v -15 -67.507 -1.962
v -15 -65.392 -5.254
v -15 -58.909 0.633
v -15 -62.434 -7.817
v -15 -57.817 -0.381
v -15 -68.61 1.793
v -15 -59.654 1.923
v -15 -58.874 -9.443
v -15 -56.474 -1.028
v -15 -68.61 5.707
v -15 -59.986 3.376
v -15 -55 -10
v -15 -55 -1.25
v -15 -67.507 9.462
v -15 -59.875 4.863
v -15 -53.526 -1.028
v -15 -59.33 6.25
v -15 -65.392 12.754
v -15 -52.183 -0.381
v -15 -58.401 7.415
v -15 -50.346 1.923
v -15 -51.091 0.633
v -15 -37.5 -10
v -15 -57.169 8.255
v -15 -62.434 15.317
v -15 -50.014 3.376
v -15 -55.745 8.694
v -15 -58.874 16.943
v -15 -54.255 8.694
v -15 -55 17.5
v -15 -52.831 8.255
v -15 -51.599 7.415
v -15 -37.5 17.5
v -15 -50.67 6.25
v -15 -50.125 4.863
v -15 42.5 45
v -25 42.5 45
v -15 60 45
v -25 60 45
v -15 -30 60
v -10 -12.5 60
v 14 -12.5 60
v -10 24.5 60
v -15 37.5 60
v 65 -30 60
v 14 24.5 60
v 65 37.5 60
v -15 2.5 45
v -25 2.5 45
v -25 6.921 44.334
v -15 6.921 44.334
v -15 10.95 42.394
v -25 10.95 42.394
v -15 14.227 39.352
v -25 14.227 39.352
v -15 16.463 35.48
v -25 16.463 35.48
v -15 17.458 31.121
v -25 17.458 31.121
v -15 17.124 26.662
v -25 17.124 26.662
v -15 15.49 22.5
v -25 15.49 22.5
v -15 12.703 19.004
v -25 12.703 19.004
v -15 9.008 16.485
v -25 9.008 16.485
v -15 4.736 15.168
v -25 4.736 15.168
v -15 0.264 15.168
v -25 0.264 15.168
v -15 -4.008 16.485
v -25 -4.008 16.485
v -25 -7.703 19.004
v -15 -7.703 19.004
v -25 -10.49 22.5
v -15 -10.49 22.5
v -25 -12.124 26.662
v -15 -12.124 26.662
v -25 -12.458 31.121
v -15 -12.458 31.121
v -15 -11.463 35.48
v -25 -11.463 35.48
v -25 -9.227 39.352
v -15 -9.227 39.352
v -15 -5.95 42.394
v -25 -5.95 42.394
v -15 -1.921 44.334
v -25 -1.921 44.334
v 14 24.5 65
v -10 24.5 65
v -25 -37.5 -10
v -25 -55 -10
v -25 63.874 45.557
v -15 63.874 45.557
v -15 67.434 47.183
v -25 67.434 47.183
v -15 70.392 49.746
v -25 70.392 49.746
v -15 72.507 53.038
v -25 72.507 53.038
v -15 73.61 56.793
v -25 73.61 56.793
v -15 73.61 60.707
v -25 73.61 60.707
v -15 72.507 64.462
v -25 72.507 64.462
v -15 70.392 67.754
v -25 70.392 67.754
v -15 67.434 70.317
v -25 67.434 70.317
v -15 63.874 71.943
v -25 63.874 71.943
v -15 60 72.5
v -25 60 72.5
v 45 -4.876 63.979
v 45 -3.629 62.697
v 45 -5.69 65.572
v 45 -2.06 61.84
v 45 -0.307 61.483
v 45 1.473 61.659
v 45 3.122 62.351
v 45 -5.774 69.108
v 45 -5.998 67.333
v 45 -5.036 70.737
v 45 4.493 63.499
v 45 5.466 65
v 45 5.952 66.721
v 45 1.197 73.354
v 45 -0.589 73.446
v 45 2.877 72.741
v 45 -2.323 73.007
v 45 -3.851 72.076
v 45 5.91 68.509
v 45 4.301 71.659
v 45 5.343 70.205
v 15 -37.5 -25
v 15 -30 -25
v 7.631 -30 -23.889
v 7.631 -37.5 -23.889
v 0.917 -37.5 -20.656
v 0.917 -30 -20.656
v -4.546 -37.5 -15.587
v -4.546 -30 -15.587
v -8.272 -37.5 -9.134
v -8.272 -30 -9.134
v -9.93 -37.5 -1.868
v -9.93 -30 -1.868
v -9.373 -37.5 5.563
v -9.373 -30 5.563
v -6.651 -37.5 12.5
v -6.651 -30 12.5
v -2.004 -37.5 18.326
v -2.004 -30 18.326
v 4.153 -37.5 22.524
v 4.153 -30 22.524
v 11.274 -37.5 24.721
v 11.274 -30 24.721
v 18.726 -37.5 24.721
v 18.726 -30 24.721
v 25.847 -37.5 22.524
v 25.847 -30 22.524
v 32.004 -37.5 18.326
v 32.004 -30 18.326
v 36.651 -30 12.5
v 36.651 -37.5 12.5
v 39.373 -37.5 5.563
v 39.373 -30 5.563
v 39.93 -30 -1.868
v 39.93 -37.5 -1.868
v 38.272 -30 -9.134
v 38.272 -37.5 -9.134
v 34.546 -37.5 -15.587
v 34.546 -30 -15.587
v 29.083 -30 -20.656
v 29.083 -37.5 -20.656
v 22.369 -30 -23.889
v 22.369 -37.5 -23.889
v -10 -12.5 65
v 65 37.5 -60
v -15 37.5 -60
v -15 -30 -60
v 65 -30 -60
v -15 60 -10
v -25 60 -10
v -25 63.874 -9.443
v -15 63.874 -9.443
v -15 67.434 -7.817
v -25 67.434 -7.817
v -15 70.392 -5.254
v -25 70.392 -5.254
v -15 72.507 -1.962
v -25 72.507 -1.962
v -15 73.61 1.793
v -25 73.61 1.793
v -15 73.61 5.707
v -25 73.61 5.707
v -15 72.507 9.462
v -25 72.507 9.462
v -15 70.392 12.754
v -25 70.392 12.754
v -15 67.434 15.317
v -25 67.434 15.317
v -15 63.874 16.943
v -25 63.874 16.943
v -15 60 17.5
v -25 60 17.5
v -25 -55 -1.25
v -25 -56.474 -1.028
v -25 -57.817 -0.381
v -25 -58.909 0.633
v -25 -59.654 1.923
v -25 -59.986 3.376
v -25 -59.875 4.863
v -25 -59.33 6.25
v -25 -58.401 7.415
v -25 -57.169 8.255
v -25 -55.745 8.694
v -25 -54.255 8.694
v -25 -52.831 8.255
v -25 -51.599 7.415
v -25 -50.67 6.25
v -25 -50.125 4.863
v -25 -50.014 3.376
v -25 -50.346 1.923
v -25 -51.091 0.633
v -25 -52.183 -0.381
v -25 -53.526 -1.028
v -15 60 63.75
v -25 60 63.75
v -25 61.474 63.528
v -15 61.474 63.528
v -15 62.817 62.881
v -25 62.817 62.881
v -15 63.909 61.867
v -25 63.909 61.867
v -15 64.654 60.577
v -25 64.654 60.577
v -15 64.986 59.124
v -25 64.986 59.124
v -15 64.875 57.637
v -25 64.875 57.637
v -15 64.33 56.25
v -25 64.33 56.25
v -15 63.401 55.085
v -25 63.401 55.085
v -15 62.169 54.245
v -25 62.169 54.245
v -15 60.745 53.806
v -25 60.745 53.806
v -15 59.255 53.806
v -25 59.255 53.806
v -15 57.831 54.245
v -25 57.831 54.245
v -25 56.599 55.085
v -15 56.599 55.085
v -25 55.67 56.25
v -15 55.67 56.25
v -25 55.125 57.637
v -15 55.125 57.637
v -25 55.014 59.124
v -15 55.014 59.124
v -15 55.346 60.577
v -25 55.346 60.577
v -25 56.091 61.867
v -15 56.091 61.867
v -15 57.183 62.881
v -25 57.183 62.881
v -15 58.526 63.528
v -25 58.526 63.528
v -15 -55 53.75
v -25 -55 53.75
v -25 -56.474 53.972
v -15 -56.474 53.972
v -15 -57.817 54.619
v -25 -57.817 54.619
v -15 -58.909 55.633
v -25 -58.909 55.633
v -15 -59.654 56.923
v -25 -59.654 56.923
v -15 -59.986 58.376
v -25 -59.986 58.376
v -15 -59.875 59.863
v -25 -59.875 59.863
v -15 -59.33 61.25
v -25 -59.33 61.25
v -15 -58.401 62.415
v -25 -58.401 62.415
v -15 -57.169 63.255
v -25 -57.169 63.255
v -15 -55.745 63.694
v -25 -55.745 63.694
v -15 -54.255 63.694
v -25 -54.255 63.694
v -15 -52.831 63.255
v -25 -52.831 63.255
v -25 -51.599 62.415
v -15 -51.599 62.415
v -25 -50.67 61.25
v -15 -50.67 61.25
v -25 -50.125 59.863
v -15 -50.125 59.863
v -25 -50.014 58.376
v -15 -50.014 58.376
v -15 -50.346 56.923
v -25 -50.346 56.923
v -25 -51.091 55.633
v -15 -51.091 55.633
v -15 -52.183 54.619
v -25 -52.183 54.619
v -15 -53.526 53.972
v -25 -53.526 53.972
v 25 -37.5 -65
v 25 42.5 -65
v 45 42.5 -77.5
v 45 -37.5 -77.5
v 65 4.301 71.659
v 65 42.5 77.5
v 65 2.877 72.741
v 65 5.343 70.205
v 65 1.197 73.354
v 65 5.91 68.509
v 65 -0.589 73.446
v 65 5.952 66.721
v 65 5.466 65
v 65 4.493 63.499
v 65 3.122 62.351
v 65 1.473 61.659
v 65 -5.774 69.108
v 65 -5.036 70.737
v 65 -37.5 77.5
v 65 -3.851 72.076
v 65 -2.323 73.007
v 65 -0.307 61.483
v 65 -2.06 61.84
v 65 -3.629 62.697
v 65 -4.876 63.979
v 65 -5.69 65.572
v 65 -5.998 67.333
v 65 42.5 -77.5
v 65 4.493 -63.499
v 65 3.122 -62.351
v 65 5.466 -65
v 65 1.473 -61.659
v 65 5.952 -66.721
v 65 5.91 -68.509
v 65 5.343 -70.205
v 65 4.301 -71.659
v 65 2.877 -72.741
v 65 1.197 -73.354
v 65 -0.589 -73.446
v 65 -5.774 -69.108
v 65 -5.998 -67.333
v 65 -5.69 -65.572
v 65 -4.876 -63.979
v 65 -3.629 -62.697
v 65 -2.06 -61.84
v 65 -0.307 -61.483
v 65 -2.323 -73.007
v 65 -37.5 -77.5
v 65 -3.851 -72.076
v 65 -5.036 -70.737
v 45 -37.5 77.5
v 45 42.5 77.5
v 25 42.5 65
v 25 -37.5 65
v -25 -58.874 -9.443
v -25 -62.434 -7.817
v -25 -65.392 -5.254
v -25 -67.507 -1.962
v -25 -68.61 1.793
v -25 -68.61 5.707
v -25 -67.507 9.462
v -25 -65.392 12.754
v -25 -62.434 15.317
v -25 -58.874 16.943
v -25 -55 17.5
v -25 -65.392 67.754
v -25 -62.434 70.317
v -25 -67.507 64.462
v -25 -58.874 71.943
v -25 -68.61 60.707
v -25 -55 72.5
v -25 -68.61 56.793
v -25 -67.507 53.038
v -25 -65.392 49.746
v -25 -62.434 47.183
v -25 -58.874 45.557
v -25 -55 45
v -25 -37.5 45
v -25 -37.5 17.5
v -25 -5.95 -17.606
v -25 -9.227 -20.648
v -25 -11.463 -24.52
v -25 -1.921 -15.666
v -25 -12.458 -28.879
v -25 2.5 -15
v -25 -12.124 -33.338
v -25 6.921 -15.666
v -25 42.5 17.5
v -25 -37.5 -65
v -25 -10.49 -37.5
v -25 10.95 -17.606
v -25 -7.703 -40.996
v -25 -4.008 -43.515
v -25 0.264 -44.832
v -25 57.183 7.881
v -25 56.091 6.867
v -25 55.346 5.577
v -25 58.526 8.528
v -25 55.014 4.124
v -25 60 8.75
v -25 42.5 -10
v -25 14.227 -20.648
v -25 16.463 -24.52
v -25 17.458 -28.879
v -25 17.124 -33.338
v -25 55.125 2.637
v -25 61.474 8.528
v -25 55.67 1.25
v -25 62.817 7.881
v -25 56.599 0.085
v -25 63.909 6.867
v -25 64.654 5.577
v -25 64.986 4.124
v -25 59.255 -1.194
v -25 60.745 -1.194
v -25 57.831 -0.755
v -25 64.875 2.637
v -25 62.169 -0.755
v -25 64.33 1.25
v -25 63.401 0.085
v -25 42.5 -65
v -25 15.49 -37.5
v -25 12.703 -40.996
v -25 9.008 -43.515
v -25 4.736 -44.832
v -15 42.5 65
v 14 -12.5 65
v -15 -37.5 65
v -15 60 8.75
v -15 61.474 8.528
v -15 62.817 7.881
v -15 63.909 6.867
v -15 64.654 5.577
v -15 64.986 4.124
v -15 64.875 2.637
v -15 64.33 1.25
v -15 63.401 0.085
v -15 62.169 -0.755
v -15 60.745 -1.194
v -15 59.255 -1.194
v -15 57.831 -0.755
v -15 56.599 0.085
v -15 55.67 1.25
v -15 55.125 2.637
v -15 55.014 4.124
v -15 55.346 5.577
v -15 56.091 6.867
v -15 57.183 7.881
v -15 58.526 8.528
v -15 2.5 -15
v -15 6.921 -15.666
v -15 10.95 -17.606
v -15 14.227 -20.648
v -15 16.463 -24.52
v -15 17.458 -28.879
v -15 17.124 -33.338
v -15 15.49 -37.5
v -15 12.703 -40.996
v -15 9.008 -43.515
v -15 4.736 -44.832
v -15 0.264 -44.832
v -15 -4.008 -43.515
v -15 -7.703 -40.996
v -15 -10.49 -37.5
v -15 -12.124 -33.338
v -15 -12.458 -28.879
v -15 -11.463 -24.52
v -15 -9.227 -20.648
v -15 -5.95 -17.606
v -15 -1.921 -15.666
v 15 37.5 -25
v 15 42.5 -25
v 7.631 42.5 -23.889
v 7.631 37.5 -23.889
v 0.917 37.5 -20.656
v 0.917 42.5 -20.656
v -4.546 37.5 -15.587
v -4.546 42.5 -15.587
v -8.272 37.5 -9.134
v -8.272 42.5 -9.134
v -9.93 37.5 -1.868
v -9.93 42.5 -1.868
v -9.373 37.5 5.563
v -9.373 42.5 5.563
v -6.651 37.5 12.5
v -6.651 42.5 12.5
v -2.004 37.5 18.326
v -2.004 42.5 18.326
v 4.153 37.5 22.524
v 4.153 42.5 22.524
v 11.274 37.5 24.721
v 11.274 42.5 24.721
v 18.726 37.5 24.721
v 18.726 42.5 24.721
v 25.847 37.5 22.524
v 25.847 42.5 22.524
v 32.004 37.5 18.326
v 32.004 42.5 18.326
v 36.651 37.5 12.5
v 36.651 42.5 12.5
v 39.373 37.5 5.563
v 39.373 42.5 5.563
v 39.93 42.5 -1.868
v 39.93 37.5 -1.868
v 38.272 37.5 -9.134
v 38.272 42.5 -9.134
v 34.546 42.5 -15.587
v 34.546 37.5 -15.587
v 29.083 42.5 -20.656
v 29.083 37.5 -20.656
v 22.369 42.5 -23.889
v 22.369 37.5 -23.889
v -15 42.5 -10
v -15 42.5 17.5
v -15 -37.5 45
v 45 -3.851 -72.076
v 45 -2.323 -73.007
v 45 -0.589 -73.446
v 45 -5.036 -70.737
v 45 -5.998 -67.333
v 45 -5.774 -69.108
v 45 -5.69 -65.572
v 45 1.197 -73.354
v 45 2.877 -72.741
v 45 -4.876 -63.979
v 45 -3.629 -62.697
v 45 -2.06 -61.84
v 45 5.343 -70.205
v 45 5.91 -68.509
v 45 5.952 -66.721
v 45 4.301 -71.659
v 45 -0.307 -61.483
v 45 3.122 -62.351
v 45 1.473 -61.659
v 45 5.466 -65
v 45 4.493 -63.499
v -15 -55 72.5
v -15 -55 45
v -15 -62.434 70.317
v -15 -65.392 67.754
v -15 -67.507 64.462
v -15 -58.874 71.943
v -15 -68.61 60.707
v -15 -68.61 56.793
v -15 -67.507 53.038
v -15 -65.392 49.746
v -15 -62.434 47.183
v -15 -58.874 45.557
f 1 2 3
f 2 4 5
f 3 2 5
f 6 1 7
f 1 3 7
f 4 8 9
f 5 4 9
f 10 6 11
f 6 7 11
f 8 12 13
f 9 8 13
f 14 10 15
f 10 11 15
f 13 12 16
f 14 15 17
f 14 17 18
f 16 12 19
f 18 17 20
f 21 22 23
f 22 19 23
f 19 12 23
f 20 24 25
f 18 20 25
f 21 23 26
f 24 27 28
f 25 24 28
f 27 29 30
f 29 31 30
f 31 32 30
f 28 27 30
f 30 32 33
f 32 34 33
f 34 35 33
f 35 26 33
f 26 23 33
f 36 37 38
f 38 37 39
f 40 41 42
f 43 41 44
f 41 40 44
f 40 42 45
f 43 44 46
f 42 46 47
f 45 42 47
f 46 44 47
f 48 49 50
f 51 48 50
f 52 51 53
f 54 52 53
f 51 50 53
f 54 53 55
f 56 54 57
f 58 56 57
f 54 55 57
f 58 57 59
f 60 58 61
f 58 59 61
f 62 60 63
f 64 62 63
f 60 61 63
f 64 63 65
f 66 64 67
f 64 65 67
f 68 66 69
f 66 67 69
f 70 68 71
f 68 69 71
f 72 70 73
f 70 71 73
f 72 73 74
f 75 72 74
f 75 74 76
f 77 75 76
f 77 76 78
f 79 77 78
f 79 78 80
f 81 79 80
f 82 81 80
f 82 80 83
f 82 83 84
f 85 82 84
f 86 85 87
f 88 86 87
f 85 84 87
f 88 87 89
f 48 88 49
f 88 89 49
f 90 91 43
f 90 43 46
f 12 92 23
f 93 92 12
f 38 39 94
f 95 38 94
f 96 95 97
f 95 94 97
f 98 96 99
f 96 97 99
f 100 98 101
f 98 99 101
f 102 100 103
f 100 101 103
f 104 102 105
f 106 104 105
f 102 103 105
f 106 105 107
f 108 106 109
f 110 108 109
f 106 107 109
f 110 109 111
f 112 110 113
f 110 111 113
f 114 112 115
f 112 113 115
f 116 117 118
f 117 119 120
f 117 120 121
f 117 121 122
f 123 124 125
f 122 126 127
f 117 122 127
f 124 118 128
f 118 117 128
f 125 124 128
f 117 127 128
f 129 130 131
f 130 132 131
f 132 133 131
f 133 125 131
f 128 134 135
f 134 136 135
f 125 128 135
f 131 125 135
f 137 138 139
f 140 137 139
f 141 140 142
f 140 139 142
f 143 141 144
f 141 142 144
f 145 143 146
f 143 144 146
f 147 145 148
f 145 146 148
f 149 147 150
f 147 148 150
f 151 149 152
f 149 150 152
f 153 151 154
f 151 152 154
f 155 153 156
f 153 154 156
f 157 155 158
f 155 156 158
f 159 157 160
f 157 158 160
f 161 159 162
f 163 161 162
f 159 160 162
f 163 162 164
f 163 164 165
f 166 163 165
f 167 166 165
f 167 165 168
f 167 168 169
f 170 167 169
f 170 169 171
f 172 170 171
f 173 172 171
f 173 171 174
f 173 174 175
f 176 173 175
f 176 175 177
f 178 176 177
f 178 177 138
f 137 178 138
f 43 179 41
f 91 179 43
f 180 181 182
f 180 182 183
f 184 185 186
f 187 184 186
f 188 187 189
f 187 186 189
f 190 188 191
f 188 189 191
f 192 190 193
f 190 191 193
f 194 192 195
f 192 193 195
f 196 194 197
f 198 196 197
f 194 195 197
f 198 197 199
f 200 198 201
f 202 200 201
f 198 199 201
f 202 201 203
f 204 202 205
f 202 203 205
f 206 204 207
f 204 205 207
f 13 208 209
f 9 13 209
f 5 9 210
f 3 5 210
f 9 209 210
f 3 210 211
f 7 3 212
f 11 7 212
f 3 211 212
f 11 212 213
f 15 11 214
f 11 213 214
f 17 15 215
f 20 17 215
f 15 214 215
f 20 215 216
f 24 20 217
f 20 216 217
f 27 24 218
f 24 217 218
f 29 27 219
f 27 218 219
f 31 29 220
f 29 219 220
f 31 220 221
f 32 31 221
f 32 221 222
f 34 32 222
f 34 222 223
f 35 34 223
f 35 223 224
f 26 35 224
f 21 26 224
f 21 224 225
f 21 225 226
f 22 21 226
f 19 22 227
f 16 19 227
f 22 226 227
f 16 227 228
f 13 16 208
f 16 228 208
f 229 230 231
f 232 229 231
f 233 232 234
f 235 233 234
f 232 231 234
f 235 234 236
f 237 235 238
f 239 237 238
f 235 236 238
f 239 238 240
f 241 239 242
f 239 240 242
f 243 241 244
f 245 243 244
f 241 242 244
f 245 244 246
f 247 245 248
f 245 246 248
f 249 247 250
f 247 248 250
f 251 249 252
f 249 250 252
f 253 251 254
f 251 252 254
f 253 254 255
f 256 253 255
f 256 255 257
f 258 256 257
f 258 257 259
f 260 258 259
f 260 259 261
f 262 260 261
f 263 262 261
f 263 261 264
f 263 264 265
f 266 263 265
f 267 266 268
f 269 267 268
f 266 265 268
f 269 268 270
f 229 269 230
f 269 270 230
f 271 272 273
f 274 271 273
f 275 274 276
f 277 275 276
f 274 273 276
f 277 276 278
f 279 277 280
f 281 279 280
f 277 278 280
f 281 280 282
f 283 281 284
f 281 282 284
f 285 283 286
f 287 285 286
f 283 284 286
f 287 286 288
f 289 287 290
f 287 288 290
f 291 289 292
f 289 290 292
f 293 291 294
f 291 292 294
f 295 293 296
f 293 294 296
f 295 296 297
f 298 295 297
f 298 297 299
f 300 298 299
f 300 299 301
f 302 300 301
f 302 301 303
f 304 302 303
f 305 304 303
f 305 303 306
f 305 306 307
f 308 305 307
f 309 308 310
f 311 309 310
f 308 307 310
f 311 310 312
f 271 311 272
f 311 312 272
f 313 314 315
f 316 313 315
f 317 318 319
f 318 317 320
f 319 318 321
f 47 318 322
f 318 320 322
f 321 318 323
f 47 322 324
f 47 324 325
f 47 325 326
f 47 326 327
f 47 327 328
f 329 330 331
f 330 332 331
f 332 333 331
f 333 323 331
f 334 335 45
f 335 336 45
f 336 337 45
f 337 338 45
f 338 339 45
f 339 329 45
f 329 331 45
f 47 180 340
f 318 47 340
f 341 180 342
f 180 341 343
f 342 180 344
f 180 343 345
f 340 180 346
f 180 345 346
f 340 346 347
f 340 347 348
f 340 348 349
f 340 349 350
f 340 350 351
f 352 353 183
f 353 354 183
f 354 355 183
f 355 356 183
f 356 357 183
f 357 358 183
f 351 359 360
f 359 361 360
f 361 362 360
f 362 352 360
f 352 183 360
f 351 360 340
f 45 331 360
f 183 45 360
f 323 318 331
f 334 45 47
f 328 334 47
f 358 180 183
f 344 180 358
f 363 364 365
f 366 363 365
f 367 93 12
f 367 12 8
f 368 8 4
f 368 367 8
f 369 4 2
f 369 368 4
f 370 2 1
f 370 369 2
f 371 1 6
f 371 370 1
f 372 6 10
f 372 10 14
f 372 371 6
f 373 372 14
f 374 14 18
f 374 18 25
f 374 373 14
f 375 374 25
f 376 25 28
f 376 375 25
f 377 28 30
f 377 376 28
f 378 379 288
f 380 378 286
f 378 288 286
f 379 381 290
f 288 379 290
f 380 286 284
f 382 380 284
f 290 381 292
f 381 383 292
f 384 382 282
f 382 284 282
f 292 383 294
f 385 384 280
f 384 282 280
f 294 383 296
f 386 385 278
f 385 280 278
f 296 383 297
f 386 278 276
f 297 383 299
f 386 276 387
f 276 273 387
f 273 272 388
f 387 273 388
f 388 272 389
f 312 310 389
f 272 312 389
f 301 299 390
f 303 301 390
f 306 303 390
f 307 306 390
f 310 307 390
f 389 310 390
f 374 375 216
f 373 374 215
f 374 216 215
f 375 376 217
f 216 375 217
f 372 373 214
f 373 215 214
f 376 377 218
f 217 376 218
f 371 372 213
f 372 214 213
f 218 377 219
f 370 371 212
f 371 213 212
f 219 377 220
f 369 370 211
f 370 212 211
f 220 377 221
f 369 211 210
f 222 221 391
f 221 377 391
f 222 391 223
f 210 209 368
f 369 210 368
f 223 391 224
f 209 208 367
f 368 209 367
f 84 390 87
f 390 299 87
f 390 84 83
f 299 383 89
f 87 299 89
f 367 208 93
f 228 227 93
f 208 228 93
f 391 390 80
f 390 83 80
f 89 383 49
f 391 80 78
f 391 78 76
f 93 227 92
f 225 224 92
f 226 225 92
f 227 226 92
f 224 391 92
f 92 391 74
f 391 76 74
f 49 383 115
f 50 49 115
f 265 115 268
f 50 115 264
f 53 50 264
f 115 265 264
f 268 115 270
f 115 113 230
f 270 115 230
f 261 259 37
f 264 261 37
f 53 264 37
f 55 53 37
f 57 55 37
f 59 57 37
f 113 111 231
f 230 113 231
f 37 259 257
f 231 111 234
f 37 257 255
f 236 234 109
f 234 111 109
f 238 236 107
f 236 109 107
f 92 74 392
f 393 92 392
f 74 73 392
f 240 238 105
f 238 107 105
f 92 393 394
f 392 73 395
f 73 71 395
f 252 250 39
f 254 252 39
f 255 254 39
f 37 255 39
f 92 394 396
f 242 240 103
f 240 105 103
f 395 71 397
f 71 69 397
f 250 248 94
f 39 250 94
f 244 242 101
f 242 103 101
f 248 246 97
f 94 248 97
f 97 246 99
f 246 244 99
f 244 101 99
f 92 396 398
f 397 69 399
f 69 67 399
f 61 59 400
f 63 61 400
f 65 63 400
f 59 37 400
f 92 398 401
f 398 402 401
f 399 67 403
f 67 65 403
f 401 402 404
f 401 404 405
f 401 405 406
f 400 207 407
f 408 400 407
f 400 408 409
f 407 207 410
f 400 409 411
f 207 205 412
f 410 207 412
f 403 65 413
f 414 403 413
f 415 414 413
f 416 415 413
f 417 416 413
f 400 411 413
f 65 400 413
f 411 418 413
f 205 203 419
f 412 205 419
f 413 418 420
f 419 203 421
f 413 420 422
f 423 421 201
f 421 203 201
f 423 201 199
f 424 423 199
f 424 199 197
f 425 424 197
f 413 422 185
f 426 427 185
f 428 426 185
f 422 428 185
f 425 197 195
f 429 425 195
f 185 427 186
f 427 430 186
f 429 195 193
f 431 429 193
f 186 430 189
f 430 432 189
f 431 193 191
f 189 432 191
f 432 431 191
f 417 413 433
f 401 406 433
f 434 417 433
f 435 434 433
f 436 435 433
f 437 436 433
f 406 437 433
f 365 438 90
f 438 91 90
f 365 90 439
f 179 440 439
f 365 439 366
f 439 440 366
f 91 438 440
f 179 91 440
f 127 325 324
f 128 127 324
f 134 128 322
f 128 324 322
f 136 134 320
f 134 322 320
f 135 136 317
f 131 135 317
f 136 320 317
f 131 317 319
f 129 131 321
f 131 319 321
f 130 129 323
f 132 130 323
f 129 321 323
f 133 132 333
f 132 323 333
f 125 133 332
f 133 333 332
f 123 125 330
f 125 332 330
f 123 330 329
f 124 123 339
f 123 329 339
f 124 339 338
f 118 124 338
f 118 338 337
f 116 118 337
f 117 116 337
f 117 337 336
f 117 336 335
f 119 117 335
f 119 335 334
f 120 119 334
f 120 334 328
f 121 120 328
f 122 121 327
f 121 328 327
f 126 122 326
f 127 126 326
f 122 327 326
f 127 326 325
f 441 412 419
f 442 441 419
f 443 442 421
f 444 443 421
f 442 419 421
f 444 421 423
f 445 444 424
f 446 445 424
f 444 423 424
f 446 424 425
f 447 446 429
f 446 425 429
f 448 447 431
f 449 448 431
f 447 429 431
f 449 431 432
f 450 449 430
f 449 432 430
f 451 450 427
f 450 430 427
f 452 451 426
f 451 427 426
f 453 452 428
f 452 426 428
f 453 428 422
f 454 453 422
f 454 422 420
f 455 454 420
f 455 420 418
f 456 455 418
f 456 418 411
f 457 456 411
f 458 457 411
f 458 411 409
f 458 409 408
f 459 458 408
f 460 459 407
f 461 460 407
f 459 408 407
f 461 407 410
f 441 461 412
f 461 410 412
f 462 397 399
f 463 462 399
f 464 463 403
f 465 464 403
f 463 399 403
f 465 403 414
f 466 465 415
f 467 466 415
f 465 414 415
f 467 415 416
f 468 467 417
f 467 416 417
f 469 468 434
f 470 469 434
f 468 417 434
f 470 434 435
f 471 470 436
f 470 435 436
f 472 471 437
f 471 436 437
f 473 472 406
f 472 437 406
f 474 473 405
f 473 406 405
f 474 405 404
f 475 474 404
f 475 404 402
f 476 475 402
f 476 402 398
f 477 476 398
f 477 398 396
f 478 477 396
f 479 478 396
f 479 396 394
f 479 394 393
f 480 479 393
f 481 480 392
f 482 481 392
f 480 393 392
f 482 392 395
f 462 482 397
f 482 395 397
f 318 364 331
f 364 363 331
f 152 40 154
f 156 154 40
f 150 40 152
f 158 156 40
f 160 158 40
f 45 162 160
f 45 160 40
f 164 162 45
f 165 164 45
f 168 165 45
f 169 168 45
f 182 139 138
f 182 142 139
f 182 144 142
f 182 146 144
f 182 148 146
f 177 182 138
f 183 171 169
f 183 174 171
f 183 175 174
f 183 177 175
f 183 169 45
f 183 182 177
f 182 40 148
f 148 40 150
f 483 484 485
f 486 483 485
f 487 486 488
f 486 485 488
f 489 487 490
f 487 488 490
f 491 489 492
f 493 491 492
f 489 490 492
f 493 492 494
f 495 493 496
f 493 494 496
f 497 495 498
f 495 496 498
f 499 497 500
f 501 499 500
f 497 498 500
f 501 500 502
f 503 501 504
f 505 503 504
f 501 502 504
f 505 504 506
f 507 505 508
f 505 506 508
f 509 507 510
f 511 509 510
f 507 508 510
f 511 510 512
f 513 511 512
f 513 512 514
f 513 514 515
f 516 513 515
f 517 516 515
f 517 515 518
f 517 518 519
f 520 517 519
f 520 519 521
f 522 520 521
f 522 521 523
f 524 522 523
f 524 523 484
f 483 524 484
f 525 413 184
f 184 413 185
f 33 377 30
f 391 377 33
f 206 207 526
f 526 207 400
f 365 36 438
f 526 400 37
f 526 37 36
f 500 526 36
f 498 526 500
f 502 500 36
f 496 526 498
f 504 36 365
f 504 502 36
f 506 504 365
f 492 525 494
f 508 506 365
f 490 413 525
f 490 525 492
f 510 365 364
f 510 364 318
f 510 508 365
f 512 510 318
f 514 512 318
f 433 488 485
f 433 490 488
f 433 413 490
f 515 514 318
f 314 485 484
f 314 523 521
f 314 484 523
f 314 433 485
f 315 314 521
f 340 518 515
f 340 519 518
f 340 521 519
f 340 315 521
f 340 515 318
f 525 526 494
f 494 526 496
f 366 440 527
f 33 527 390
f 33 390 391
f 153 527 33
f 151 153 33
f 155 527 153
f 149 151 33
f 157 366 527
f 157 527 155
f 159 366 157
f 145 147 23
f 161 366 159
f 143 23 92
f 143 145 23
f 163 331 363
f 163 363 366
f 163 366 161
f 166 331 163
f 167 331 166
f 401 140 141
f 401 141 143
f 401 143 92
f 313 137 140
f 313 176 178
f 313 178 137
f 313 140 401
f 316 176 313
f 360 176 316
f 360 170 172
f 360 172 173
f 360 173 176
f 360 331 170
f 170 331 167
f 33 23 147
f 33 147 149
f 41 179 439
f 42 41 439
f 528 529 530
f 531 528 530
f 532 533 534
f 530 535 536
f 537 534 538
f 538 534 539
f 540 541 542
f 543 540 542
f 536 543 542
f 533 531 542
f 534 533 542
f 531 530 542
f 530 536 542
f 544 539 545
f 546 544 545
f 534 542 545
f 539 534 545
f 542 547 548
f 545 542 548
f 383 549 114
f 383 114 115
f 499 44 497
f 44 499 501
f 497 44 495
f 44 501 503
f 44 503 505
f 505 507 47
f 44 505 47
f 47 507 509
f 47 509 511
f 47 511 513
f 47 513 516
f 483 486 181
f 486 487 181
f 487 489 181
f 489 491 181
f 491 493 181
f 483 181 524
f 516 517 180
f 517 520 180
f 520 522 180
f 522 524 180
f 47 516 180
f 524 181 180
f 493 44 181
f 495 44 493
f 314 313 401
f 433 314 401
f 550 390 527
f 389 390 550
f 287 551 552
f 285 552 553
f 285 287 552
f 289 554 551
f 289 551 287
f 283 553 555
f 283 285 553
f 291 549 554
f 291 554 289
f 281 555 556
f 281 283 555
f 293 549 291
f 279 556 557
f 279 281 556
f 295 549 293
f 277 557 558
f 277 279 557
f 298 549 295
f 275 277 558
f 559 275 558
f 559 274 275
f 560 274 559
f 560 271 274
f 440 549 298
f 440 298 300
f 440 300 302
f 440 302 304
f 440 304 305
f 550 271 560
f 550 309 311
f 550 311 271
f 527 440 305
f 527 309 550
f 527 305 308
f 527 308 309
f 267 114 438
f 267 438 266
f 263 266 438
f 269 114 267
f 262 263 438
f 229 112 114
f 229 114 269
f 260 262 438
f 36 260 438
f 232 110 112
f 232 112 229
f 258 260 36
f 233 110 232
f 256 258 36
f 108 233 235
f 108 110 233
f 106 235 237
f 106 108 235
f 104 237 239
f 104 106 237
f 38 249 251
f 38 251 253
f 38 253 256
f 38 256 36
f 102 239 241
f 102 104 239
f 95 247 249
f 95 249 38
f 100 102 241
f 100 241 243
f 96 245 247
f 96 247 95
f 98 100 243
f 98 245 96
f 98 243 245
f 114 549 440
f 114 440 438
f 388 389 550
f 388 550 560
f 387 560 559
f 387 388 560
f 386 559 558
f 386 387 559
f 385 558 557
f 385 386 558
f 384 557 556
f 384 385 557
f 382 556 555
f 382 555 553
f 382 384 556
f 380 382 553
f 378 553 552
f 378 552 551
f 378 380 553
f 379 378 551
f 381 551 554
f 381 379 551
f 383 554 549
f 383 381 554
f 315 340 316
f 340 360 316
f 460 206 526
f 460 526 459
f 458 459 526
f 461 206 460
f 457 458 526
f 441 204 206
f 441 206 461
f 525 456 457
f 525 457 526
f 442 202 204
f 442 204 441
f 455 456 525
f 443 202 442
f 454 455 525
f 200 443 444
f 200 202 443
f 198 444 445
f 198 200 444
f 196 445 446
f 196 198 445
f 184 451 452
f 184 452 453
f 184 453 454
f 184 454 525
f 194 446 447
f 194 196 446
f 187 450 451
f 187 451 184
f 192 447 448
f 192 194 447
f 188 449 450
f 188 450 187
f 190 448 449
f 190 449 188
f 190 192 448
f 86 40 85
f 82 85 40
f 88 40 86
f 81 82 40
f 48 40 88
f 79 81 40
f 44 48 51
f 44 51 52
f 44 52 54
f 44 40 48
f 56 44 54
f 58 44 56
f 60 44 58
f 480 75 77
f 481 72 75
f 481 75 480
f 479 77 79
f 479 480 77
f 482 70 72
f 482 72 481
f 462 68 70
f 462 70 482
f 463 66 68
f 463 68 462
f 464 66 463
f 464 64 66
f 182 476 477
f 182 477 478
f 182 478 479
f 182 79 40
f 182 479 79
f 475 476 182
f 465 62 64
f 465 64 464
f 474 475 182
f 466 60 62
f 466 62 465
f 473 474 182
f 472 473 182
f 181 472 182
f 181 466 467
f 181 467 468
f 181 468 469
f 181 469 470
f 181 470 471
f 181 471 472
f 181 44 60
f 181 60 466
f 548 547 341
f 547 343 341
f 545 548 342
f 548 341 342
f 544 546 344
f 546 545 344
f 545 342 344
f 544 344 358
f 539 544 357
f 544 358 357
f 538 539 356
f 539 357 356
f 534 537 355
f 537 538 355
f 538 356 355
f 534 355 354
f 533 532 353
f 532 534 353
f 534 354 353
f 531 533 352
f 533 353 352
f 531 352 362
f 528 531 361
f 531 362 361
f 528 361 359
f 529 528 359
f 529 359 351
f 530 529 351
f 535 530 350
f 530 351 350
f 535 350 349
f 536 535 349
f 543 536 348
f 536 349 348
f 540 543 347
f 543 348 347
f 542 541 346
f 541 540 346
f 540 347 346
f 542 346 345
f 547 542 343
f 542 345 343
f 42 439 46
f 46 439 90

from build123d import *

# Parameters (mm, degrees)
SKETCH2_W             = 130
SKETCH2_H             = 130
BOSS_EXTRUDE2_DEPTH   = 37.5
SKETCH3_W             = 80
SKETCH3_H             = 120
CUT_EXTRUDE1_DEPTH    = 67.5
SKETCH15_W            = 81.593666544
SKETCH15_H            = 171.523851769
CUT_EXTRUDE9_DEPTH    = 119.638105177
SKETCH5_W             = 12.5
SKETCH5_H             = 75
BOSS_EXTRUDE4_DEPTH   = 20
BOSS_EXTRUDE4_2_DEPTH = 20
SKETCH7_R             = 6
CUT_EXTRUDE10_DEPTH   = 20
BOSS_EXTRUDE7_DEPTH   = 5
SKETCH17_W            = 24
SKETCH17_H            = 37
CUT_EXTRUDE11_DEPTH   = 5
SKETCH18_R            = 5
BOSS_EXTRUDE8_DEPTH   = 10
LPATTERN2_COUNT       = 2
LPATTERN2_PITCH       = 55
CUT_EXTRUDE12_REACH   = 152.359
SKETCH20_R            = 25
SKETCH21_R            = 15
CUT_EXTRUDE13_DEPTH   = 10
BOSS_EXTRUDE9_DEPTH   = 80
SKETCH23_W            = 10
SKETCH23_H            = 7.5
BOSS_EXTRUDE10_DEPTH  = 80


with BuildPart() as part:
    # Sketch2 → Boss-Extrude2 (new, symmetric)
    with BuildSketch(Plane(origin=(0, 0, 0), x_dir=(1, 0, 0), z_dir=(0, 1, 0))):
        Rectangle(SKETCH2_W, SKETCH2_H)
    extrude(amount=BOSS_EXTRUDE2_DEPTH, both=True)

    # Sketch3 → Cut-Extrude1 (cut)
    with BuildSketch(Plane(origin=(0, 37.5, 0), x_dir=(1, 0, 0), z_dir=(0, 1, 0))):
        with Locations((25, 0)):
            Rectangle(SKETCH3_W, SKETCH3_H)
    extrude(amount=-CUT_EXTRUDE1_DEPTH, mode=Mode.SUBTRACT)

    # Sketch15 → Cut-Extrude9 (cut, through all)
    with BuildSketch(Plane(origin=(0, 37.5, 0), x_dir=(1, 0, 0), z_dir=(0, 1, 0))):
        with Locations((-65.796833272, -4.787594099)):
            Rectangle(SKETCH15_W, SKETCH15_H)
    extrude(amount=-CUT_EXTRUDE9_DEPTH, mode=Mode.SUBTRACT)


with BuildPart() as body_2:
    # Sketch5 → Boss-Extrude4 (new body)
    with BuildSketch(Plane(origin=(65, 0, 0), x_dir=(0, 0, -1), z_dir=(1, 0, 0))):
        with Locations((-71.25, 0)):
            Rectangle(SKETCH5_W, SKETCH5_H)
    extrude(amount=-BOSS_EXTRUDE4_DEPTH)


with BuildPart() as body_3:
    # Sketch5 → Boss-Extrude4 2 (new body)
    with BuildSketch(Plane(origin=(65, 0, 0), x_dir=(0, 0, -1), z_dir=(1, 0, 0))):
        with Locations((71.25, 0)):
            Rectangle(SKETCH5_W, SKETCH5_H)
    extrude(amount=-BOSS_EXTRUDE4_2_DEPTH)


with BuildPart() as cut_extrude10_tool:
    # Sketch7 → Cut-Extrude10 (new body)
    with BuildSketch(Plane(origin=(65, 0, 0), x_dir=(0, 0, -1), z_dir=(1, 0, 0))):
        with Locations((-67.475, 0)):
            Circle(SKETCH7_R)
        with Locations((67.475, 0)):
            Circle(SKETCH7_R)
    extrude(amount=-CUT_EXTRUDE10_DEPTH)


with BuildPart() as part_1:
    add(part.part)

    # Cut-Extrude10: cut by cut_extrude10_tool
    add(cut_extrude10_tool.part, mode=Mode.SUBTRACT)



with BuildPart() as body_2_1:
    add(body_2.part)

    # Cut-Extrude10: cut by cut_extrude10_tool
    add(cut_extrude10_tool.part, mode=Mode.SUBTRACT)


with BuildPart() as body_3_1:
    add(body_3.part)

    # Cut-Extrude10: cut by cut_extrude10_tool
    add(cut_extrude10_tool.part, mode=Mode.SUBTRACT)


with BuildPart() as part_2:
    add(part_1.part)

    add(body_2_1.part)  # Boss-Extrude7 merges body 2

    add(body_3_1.part)  # Boss-Extrude7 merges body 3
    # Sketch16 → Boss-Extrude7 (add)
    with BuildSketch(Plane(origin=(0, 37.5, 0), x_dir=(1, 0, 0), z_dir=(0, 1, 0))):
        Polygon((-25, 65), (-25, -65), (45, -65), (45, -77.5), (65, -77.5), (65, 77.5), (45, 77.5), (45, 65), align=None)
    extrude(amount=BOSS_EXTRUDE7_DEPTH)

    # Sketch17 → Cut-Extrude11 (cut)
    with BuildSketch(Plane.XY.offset(65)):
        with Locations((2, 6)):
            Rectangle(SKETCH17_W, SKETCH17_H)
    extrude(amount=-CUT_EXTRUDE11_DEPTH, mode=Mode.SUBTRACT)

    # Sketch18 → Boss-Extrude8 (add)
    # profile 1 of 2: a face of its own
    with BuildSketch(Plane.ZY.offset(25)):
        with BuildLine():
            Line((45, 42.5), (45, 60))
            ThreePointArc((45, 60), (58.75, 73.75), (72.5, 60))
            Line((72.5, 60), (72.5, 42.5))
            Line((72.5, 42.5), (45, 42.5))
        make_face()
        with Locations((58.75, 60)):
            Circle(SKETCH18_R, mode=Mode.SUBTRACT)
    # profile 2 of 2: a face of its own
    with BuildSketch(Plane.ZY.offset(25)):
        with BuildLine():
            Line((72.5, -37.5), (45, -37.5))
            Line((45, -37.5), (45, -55))
            ThreePointArc((45, -55), (58.75, -68.75), (72.5, -55))
            Line((72.5, -55), (72.5, -37.5))
        make_face()
        with Locations(Location((58.75, -55, 0), (0, 0, 180))):
            Circle(SKETCH18_R, mode=Mode.SUBTRACT)
    boss_extrude8 = extrude(amount=-BOSS_EXTRUDE8_DEPTH)

    # LPattern2: Boss-Extrude8 ×2
    with Locations(*[(0, 0, -i * LPATTERN2_PITCH) for i in range(1, LPATTERN2_COUNT)]):
        add(boss_extrude8)

    # Cut-Extrude12: up to this face of the body (flat: up to its plane)
    cut_extrude12_end = Plane(part_2.part.faces().sort_by_distance((23.113006397, -37.5, -1.026119403))[0])
    # Sketch20 → Cut-Extrude12 (cut, up to the picked face)
    with BuildSketch(Plane(origin=(0, 42.5, 0), x_dir=(1, 0, 0), z_dir=(0, 1, 0)), mode=Mode.PRIVATE) as cut_extrude12_sk1:
        with Locations(Location((15, 0, 0), (0, 0, 90))):
            Circle(SKETCH20_R)
    cut_extrude12_tool1 = split(extrude(cut_extrude12_sk1.sketch, amount=-CUT_EXTRUDE12_REACH, mode=Mode.PRIVATE), bisect_by=cut_extrude12_end, keep=Keep.BOTH, mode=Mode.PRIVATE)
    add(cut_extrude12_tool1.solids().sort_by(Axis((15, 42.5, 0), (0, -1, 0)))[0], mode=Mode.SUBTRACT)

    # Sketch21 → Cut-Extrude13 (cut)
    with BuildSketch(Plane.ZY.offset(25)):
        with Locations((30, 2.5)):
            Circle(SKETCH21_R)
        with Locations((-30, 2.5)):
            Circle(SKETCH21_R)
    extrude(amount=-CUT_EXTRUDE13_DEPTH, mode=Mode.SUBTRACT)

    # Sketch22 → Boss-Extrude9 (add)
    with BuildSketch(Plane(origin=(0, 42.5, 0), x_dir=(1, 0, 0), z_dir=(0, 1, 0))):
        Polygon((45, -65), (45, -77.5), (25, -65), align=None)
        Polygon((45, 77.5), (45, 65), (25, 65), align=None)
    extrude(amount=-BOSS_EXTRUDE9_DEPTH)

    # Sketch23 → Boss-Extrude10 (add)
    with BuildSketch(Plane(origin=(0, 42.5, 0), x_dir=(-1, 0, 0), z_dir=(0, -1, 0))):
        with Locations((20, -68.75)):
            Rectangle(SKETCH23_W, SKETCH23_H)
    extrude(amount=BOSS_EXTRUDE10_DEPTH)


solid = part_2.part
